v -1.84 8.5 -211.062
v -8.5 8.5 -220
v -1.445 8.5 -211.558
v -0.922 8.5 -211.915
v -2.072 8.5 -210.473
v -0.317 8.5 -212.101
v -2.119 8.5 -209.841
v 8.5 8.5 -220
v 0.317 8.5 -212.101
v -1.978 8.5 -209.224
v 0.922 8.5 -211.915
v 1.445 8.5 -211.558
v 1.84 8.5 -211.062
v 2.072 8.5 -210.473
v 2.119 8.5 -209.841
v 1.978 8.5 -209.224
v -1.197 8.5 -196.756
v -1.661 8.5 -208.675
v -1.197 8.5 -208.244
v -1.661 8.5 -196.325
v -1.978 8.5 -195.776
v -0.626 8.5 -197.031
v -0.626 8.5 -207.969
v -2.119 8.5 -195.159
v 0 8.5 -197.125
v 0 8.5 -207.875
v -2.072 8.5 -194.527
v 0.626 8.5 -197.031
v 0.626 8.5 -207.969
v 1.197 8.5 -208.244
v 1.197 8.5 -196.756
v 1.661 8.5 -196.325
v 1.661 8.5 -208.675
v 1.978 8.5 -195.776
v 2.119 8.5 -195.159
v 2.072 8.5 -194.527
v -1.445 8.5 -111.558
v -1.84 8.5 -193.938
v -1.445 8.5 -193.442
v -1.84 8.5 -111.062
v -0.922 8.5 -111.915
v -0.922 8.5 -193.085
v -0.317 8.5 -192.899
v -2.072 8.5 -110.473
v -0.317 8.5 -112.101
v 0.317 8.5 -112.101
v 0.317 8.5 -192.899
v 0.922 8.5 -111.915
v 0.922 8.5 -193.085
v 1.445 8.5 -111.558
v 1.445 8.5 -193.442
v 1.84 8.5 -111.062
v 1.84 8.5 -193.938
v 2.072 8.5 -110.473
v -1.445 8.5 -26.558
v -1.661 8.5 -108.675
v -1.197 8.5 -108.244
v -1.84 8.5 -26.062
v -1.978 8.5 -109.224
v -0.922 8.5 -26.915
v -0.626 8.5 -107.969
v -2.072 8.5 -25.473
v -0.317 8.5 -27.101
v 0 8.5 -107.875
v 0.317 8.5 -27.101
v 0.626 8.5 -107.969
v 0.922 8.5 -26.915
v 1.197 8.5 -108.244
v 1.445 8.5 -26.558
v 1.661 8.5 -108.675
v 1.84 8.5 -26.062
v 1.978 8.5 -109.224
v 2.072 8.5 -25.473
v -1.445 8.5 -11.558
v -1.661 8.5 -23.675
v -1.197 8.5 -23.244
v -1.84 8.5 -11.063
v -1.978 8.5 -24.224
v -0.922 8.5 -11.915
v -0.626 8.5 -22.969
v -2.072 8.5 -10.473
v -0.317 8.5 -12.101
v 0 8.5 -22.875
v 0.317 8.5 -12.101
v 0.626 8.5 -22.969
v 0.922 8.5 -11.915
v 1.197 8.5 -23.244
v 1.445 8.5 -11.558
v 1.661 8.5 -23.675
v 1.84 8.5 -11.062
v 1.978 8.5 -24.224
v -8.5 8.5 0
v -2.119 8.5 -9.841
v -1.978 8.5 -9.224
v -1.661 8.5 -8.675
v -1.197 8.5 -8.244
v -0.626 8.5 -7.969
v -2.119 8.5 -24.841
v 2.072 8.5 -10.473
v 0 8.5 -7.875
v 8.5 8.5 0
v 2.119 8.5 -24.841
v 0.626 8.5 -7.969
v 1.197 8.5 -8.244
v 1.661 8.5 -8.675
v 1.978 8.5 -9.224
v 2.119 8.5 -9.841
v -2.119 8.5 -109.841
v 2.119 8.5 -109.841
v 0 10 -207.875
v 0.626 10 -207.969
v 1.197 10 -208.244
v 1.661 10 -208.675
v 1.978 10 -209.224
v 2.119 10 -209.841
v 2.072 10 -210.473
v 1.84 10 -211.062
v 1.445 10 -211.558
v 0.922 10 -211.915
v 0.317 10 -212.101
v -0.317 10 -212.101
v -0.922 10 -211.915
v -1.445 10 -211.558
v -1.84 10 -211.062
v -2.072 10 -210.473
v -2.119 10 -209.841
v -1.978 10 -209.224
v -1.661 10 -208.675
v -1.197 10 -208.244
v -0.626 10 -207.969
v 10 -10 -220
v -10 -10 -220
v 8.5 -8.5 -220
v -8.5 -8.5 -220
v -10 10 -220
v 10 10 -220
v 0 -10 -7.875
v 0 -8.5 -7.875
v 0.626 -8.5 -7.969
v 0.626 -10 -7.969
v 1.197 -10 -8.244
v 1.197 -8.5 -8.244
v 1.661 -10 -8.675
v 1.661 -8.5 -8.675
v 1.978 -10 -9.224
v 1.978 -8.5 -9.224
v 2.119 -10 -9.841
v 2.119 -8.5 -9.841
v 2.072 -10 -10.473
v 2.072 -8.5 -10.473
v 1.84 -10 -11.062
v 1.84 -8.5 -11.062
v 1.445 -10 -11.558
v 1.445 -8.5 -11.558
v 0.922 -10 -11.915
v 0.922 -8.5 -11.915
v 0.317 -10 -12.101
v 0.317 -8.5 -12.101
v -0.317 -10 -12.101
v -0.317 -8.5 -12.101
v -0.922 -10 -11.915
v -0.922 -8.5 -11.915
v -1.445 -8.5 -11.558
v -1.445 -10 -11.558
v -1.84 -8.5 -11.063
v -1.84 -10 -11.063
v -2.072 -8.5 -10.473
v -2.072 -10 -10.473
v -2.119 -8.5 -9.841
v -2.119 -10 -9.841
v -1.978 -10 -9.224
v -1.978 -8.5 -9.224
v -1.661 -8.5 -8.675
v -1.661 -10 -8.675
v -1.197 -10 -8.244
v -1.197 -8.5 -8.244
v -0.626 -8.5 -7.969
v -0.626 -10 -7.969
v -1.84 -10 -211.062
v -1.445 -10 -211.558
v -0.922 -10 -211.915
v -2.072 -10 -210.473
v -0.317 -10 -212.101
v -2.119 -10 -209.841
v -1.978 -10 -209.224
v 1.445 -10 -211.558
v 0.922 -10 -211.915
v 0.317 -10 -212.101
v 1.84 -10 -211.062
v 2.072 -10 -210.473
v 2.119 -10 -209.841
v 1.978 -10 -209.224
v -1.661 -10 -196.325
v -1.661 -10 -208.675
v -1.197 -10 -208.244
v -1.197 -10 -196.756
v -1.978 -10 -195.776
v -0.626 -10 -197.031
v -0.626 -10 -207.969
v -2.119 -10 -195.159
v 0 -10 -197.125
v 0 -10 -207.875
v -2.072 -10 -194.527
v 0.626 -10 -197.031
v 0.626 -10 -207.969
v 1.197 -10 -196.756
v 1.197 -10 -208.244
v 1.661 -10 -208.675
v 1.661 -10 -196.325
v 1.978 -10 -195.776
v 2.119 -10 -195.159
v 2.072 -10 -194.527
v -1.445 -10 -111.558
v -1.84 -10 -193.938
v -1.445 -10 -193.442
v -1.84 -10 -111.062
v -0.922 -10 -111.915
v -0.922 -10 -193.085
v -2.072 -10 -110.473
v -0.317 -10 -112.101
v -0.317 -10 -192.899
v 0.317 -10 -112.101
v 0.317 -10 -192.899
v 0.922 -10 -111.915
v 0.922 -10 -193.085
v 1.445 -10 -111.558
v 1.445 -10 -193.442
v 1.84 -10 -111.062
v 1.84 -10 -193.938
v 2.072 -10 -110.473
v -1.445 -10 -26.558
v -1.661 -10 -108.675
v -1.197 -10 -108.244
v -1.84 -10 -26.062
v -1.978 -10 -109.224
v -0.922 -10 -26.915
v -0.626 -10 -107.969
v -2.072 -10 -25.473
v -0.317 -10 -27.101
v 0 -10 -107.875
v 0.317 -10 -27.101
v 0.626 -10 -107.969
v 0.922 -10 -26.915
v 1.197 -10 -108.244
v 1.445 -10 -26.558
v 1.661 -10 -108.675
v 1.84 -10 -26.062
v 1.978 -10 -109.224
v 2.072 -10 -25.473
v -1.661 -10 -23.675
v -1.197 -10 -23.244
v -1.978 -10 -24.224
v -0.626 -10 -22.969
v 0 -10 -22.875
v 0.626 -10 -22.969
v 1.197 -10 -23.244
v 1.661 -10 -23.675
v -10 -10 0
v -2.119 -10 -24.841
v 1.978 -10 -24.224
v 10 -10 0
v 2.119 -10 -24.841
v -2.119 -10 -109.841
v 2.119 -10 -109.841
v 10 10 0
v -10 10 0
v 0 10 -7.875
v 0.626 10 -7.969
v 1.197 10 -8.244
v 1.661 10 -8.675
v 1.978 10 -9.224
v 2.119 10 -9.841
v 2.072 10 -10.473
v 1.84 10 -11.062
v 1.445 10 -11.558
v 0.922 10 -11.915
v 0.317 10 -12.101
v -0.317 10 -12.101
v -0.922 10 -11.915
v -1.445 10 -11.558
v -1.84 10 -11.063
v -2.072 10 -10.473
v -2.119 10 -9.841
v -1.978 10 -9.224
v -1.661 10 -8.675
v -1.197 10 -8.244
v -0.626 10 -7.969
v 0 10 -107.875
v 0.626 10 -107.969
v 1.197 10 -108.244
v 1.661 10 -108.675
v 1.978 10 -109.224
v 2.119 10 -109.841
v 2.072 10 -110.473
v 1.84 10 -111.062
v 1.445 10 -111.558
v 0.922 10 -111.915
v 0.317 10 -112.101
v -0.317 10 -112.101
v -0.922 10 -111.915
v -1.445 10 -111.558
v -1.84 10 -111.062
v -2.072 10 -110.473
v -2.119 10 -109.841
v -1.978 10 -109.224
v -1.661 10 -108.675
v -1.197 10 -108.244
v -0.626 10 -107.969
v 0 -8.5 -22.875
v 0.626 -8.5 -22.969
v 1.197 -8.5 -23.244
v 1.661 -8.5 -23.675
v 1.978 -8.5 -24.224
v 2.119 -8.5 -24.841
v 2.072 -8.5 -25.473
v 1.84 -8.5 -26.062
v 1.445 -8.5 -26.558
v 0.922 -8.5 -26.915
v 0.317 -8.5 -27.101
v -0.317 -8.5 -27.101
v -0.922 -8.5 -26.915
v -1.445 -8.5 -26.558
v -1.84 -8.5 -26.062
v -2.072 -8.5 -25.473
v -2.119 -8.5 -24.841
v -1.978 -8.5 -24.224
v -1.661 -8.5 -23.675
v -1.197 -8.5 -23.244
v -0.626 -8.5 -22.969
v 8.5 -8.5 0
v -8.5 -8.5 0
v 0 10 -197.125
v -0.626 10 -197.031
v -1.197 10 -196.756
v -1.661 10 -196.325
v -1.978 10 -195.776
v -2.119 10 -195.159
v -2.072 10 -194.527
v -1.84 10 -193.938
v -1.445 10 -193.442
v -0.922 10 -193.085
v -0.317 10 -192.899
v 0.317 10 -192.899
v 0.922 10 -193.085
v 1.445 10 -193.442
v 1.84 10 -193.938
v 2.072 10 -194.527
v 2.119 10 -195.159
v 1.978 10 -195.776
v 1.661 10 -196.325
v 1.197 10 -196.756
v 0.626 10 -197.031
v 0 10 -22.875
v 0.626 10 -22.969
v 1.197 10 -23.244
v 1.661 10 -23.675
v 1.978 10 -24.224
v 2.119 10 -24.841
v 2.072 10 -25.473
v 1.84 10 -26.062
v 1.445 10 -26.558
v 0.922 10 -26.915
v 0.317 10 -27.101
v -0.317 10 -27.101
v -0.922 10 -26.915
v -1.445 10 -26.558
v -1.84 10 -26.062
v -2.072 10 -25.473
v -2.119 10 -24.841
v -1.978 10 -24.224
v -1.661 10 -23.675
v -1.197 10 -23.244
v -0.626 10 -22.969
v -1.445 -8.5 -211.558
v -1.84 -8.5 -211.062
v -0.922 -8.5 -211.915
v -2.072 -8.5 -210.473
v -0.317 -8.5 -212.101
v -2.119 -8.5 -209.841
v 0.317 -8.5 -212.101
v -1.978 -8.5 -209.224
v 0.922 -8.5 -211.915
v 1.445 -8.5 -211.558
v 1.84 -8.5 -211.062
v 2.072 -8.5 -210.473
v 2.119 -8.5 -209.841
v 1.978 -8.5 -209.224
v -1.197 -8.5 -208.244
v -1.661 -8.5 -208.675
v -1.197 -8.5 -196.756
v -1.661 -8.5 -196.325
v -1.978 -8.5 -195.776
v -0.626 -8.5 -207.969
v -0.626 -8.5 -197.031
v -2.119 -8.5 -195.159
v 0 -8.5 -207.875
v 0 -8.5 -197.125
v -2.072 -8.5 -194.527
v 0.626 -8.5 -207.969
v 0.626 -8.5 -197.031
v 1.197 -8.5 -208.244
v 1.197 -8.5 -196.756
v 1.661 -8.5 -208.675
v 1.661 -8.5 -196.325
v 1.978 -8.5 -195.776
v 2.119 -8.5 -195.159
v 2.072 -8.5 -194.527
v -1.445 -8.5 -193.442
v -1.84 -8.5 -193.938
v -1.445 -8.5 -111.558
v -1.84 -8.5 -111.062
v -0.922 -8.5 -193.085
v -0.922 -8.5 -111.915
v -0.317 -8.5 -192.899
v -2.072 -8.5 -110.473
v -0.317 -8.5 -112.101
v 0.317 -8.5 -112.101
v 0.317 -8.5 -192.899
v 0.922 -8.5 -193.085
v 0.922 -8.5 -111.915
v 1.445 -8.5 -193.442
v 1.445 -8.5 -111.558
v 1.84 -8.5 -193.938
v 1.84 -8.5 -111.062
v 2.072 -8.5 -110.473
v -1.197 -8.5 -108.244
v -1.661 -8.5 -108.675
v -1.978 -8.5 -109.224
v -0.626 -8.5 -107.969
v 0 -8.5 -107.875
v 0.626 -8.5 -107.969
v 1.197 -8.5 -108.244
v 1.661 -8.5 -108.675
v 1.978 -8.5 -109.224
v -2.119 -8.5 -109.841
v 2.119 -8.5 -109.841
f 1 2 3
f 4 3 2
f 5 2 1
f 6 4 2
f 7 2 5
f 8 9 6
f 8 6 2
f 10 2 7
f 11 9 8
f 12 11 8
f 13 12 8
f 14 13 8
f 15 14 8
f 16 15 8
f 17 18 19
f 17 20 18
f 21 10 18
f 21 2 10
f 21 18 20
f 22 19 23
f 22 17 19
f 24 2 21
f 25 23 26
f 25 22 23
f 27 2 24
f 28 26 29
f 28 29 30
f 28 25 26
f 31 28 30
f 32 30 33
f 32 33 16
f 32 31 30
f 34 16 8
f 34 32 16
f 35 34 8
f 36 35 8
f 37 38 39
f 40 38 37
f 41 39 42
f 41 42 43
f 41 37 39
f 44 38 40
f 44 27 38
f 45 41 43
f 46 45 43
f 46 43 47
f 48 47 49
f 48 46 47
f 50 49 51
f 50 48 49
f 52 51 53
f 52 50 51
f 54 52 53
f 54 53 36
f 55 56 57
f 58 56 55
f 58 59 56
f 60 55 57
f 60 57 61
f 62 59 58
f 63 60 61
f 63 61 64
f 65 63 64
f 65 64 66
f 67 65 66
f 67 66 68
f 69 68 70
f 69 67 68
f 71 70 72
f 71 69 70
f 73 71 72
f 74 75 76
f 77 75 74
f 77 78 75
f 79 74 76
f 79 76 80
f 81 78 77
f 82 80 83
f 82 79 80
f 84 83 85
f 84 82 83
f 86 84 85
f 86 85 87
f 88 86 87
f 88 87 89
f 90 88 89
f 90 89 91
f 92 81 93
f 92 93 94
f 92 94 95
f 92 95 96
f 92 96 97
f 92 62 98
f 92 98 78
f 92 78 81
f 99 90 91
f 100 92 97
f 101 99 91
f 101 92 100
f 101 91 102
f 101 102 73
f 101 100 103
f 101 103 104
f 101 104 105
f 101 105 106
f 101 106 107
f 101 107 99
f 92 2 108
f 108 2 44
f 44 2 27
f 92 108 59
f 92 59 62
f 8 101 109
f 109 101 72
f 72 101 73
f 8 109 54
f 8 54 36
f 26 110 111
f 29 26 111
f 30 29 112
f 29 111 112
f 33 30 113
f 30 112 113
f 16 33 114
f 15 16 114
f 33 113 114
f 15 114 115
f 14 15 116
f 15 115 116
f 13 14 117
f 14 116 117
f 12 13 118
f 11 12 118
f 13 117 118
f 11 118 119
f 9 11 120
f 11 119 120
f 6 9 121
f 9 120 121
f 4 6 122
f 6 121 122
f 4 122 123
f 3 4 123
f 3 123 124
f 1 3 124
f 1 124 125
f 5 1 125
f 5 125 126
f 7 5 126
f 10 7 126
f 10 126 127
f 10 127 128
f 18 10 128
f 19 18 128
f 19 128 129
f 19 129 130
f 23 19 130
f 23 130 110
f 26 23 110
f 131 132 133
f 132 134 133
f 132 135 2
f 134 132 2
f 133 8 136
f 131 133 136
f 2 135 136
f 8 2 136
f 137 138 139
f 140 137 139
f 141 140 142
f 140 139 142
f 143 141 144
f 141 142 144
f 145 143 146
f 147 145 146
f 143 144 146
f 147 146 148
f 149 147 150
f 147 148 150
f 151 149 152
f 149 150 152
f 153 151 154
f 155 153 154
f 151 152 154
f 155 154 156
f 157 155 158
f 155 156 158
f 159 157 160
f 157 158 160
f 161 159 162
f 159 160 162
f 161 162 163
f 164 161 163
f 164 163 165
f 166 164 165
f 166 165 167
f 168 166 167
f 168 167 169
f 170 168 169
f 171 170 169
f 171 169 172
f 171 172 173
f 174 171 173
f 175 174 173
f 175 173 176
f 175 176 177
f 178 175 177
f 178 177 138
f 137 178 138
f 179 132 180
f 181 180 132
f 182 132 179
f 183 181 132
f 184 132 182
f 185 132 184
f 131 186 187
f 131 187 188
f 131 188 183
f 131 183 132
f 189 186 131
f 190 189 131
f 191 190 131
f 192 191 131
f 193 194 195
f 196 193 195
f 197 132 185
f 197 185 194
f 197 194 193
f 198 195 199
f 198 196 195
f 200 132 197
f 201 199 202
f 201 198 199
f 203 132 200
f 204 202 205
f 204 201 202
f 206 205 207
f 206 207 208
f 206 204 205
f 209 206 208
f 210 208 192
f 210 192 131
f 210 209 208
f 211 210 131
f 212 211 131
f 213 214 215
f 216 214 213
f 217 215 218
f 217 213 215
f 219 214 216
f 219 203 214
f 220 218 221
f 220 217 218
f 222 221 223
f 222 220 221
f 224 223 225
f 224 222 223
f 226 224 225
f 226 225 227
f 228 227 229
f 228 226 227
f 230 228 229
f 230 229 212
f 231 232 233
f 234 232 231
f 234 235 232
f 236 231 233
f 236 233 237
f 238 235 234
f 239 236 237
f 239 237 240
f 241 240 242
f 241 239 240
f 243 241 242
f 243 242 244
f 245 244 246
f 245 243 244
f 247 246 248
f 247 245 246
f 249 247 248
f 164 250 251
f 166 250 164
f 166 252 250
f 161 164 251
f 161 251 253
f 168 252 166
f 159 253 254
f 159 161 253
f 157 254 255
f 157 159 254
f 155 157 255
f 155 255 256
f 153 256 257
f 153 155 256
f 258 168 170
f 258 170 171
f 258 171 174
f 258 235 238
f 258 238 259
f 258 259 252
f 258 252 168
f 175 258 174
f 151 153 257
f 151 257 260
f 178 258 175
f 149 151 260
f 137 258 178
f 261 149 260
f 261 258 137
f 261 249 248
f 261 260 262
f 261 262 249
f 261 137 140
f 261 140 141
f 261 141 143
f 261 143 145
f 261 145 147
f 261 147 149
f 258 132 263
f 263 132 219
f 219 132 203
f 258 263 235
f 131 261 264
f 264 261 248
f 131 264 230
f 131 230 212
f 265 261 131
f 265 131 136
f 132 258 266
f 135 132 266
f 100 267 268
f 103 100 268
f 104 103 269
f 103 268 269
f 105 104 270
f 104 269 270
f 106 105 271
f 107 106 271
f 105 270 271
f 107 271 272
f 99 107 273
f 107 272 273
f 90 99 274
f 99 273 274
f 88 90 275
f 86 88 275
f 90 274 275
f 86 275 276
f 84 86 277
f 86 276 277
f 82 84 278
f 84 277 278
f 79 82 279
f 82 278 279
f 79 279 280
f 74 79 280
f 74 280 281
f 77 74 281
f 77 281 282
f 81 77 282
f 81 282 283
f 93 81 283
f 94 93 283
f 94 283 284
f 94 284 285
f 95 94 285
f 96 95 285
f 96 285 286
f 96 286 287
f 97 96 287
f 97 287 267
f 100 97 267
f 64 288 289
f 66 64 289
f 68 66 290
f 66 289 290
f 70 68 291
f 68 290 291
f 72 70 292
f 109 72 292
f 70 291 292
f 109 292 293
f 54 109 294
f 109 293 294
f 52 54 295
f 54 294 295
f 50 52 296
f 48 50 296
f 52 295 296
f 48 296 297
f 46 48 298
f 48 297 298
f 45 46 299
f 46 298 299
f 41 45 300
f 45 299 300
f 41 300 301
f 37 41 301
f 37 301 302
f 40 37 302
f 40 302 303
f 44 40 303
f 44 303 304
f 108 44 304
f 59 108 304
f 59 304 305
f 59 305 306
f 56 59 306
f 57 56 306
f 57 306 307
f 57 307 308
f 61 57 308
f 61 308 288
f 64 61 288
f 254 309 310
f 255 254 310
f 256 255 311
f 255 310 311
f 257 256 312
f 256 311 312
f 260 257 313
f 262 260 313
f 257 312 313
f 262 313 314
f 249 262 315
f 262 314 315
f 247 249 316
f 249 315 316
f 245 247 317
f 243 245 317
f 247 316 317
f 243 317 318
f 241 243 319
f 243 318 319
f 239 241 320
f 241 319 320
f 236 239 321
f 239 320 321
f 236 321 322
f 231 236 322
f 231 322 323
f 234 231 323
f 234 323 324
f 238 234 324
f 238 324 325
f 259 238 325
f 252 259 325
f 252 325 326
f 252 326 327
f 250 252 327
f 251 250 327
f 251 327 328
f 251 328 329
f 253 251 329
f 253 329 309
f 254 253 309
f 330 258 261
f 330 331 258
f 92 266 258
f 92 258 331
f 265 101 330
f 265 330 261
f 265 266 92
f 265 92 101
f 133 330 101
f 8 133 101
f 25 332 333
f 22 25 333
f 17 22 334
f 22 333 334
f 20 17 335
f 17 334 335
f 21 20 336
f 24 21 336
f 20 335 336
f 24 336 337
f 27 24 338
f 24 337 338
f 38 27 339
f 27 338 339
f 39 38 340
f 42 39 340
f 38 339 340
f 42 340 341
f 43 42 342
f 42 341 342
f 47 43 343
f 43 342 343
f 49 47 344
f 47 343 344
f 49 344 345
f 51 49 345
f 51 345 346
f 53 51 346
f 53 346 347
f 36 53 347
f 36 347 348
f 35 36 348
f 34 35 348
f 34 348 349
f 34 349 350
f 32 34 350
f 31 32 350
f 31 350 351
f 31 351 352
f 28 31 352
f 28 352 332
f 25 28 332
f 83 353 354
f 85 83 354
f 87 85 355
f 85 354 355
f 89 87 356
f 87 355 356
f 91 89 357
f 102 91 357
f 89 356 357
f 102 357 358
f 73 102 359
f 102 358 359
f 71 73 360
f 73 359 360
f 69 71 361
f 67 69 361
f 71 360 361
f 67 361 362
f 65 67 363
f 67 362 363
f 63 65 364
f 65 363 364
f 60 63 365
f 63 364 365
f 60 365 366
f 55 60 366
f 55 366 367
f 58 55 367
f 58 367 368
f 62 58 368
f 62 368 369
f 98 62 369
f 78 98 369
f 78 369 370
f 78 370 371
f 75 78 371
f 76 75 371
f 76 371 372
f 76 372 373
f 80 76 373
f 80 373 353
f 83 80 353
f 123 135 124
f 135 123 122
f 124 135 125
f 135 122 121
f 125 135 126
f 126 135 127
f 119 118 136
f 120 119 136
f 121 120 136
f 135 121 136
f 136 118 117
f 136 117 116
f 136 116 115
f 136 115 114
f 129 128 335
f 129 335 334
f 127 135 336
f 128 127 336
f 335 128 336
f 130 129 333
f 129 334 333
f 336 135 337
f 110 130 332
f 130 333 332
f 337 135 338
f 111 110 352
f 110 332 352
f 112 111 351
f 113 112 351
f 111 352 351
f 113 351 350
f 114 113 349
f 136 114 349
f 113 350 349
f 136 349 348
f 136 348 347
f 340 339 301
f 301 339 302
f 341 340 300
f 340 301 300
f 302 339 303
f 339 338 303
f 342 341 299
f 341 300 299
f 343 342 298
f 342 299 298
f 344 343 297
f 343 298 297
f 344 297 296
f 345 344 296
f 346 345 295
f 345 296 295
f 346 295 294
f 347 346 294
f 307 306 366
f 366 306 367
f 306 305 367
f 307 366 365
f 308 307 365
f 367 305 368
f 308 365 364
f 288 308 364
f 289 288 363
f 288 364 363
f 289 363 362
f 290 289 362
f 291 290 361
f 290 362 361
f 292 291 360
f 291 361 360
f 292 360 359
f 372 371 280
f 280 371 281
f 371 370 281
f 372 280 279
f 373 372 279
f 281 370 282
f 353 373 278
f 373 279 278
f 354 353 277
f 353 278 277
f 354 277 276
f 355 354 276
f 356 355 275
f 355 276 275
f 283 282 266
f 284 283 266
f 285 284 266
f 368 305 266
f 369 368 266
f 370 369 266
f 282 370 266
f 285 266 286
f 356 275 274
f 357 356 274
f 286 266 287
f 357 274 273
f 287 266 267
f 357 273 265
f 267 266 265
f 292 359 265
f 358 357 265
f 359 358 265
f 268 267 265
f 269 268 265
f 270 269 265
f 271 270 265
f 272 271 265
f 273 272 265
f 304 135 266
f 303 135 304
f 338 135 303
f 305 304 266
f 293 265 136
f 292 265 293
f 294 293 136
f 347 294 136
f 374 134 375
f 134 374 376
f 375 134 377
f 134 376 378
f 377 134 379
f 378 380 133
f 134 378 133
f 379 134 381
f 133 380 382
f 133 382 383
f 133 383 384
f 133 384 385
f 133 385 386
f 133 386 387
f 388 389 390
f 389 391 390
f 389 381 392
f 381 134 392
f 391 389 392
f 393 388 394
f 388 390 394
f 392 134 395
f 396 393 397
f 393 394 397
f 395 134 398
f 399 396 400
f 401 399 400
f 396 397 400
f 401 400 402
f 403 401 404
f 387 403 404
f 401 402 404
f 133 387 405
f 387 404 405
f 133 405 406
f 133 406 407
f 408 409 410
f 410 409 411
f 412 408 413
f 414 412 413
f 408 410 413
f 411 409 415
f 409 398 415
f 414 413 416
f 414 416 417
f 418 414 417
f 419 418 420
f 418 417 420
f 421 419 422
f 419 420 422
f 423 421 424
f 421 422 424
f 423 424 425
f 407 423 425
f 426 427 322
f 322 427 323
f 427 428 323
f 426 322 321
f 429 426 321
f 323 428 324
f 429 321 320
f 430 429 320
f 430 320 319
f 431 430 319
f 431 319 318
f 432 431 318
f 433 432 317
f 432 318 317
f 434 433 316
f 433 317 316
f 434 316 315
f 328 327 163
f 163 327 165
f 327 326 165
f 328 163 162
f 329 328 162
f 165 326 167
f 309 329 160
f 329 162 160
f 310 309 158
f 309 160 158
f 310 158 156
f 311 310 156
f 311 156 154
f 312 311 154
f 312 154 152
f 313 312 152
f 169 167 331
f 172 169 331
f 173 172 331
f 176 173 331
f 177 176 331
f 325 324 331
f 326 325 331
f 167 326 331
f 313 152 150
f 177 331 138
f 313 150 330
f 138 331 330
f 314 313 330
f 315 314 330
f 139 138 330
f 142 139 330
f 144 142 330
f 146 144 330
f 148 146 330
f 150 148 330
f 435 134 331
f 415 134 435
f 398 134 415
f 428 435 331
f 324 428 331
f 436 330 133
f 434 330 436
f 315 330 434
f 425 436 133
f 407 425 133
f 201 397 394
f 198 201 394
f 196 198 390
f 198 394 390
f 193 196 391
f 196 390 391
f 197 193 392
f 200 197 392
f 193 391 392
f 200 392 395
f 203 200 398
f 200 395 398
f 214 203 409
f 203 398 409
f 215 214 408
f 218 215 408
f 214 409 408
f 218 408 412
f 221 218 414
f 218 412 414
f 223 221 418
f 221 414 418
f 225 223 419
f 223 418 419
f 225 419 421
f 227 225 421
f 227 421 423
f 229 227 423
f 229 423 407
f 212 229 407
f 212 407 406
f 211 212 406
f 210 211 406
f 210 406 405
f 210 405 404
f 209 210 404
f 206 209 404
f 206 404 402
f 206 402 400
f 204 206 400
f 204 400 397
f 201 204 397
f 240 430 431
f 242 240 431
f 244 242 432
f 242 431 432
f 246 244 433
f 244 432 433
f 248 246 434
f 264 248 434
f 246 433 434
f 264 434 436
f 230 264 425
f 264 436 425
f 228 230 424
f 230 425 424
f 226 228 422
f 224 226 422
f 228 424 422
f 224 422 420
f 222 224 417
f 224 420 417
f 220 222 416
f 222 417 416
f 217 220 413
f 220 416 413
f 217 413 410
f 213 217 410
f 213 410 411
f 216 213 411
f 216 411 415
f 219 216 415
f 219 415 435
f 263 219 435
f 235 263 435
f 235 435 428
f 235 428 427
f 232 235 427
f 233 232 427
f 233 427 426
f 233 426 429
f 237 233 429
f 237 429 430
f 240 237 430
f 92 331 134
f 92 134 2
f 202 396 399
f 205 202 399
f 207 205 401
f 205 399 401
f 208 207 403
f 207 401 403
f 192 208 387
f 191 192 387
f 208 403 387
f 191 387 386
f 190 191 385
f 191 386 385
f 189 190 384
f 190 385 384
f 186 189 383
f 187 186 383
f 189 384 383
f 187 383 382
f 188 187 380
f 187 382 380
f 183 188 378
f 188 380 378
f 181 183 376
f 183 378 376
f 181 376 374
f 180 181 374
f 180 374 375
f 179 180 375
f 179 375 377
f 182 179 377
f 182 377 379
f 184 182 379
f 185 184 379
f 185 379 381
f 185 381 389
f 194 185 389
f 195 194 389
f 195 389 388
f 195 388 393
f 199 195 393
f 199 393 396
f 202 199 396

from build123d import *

# Parameters (mm, degrees)
SKETCH1_W           = 20
SKETCH1_H           = 20
SKETCH1_W_2         = 17
SKETCH1_H_2         = 17
BOSS_EXTRUDE1_DEPTH = 220
SKETCH2_R           = 2.125
CUT_EXTRUDE1_DEPTH  = 222.133443875


with BuildPart() as part:
    # Sketch1 → Boss-Extrude1 (new body)
    with BuildSketch(Plane.XY):
        Rectangle(SKETCH1_W, SKETCH1_H)
        Rectangle(SKETCH1_W_2, SKETCH1_H_2, mode=Mode.SUBTRACT)
    extrude(amount=-BOSS_EXTRUDE1_DEPTH)

    # Sketch2 → Cut-Extrude1 (cut, through all)
    with BuildSketch(Plane(origin=(0, 10, 0), x_dir=(1, 0, 0), z_dir=(0, 1, 0))):
        with Locations(Location((0, 10, 0), (0, 0, 270))):
            Circle(SKETCH2_R)
        with Locations(Location((0, 110, 0), (0, 0, 270))):
            Circle(SKETCH2_R)
        with Locations(Location((0, 210, 0), (0, 0, 270))):
            Circle(SKETCH2_R)
        with Locations(Location((0, 25, 0), (0, 0, 270))):
            Circle(SKETCH2_R)
        with Locations(Location((0, 195, 0), (0, 0, 90))):
            Circle(SKETCH2_R)
    extrude(amount=-CUT_EXTRUDE1_DEPTH, mode=Mode.SUBTRACT)


solid = part.part
